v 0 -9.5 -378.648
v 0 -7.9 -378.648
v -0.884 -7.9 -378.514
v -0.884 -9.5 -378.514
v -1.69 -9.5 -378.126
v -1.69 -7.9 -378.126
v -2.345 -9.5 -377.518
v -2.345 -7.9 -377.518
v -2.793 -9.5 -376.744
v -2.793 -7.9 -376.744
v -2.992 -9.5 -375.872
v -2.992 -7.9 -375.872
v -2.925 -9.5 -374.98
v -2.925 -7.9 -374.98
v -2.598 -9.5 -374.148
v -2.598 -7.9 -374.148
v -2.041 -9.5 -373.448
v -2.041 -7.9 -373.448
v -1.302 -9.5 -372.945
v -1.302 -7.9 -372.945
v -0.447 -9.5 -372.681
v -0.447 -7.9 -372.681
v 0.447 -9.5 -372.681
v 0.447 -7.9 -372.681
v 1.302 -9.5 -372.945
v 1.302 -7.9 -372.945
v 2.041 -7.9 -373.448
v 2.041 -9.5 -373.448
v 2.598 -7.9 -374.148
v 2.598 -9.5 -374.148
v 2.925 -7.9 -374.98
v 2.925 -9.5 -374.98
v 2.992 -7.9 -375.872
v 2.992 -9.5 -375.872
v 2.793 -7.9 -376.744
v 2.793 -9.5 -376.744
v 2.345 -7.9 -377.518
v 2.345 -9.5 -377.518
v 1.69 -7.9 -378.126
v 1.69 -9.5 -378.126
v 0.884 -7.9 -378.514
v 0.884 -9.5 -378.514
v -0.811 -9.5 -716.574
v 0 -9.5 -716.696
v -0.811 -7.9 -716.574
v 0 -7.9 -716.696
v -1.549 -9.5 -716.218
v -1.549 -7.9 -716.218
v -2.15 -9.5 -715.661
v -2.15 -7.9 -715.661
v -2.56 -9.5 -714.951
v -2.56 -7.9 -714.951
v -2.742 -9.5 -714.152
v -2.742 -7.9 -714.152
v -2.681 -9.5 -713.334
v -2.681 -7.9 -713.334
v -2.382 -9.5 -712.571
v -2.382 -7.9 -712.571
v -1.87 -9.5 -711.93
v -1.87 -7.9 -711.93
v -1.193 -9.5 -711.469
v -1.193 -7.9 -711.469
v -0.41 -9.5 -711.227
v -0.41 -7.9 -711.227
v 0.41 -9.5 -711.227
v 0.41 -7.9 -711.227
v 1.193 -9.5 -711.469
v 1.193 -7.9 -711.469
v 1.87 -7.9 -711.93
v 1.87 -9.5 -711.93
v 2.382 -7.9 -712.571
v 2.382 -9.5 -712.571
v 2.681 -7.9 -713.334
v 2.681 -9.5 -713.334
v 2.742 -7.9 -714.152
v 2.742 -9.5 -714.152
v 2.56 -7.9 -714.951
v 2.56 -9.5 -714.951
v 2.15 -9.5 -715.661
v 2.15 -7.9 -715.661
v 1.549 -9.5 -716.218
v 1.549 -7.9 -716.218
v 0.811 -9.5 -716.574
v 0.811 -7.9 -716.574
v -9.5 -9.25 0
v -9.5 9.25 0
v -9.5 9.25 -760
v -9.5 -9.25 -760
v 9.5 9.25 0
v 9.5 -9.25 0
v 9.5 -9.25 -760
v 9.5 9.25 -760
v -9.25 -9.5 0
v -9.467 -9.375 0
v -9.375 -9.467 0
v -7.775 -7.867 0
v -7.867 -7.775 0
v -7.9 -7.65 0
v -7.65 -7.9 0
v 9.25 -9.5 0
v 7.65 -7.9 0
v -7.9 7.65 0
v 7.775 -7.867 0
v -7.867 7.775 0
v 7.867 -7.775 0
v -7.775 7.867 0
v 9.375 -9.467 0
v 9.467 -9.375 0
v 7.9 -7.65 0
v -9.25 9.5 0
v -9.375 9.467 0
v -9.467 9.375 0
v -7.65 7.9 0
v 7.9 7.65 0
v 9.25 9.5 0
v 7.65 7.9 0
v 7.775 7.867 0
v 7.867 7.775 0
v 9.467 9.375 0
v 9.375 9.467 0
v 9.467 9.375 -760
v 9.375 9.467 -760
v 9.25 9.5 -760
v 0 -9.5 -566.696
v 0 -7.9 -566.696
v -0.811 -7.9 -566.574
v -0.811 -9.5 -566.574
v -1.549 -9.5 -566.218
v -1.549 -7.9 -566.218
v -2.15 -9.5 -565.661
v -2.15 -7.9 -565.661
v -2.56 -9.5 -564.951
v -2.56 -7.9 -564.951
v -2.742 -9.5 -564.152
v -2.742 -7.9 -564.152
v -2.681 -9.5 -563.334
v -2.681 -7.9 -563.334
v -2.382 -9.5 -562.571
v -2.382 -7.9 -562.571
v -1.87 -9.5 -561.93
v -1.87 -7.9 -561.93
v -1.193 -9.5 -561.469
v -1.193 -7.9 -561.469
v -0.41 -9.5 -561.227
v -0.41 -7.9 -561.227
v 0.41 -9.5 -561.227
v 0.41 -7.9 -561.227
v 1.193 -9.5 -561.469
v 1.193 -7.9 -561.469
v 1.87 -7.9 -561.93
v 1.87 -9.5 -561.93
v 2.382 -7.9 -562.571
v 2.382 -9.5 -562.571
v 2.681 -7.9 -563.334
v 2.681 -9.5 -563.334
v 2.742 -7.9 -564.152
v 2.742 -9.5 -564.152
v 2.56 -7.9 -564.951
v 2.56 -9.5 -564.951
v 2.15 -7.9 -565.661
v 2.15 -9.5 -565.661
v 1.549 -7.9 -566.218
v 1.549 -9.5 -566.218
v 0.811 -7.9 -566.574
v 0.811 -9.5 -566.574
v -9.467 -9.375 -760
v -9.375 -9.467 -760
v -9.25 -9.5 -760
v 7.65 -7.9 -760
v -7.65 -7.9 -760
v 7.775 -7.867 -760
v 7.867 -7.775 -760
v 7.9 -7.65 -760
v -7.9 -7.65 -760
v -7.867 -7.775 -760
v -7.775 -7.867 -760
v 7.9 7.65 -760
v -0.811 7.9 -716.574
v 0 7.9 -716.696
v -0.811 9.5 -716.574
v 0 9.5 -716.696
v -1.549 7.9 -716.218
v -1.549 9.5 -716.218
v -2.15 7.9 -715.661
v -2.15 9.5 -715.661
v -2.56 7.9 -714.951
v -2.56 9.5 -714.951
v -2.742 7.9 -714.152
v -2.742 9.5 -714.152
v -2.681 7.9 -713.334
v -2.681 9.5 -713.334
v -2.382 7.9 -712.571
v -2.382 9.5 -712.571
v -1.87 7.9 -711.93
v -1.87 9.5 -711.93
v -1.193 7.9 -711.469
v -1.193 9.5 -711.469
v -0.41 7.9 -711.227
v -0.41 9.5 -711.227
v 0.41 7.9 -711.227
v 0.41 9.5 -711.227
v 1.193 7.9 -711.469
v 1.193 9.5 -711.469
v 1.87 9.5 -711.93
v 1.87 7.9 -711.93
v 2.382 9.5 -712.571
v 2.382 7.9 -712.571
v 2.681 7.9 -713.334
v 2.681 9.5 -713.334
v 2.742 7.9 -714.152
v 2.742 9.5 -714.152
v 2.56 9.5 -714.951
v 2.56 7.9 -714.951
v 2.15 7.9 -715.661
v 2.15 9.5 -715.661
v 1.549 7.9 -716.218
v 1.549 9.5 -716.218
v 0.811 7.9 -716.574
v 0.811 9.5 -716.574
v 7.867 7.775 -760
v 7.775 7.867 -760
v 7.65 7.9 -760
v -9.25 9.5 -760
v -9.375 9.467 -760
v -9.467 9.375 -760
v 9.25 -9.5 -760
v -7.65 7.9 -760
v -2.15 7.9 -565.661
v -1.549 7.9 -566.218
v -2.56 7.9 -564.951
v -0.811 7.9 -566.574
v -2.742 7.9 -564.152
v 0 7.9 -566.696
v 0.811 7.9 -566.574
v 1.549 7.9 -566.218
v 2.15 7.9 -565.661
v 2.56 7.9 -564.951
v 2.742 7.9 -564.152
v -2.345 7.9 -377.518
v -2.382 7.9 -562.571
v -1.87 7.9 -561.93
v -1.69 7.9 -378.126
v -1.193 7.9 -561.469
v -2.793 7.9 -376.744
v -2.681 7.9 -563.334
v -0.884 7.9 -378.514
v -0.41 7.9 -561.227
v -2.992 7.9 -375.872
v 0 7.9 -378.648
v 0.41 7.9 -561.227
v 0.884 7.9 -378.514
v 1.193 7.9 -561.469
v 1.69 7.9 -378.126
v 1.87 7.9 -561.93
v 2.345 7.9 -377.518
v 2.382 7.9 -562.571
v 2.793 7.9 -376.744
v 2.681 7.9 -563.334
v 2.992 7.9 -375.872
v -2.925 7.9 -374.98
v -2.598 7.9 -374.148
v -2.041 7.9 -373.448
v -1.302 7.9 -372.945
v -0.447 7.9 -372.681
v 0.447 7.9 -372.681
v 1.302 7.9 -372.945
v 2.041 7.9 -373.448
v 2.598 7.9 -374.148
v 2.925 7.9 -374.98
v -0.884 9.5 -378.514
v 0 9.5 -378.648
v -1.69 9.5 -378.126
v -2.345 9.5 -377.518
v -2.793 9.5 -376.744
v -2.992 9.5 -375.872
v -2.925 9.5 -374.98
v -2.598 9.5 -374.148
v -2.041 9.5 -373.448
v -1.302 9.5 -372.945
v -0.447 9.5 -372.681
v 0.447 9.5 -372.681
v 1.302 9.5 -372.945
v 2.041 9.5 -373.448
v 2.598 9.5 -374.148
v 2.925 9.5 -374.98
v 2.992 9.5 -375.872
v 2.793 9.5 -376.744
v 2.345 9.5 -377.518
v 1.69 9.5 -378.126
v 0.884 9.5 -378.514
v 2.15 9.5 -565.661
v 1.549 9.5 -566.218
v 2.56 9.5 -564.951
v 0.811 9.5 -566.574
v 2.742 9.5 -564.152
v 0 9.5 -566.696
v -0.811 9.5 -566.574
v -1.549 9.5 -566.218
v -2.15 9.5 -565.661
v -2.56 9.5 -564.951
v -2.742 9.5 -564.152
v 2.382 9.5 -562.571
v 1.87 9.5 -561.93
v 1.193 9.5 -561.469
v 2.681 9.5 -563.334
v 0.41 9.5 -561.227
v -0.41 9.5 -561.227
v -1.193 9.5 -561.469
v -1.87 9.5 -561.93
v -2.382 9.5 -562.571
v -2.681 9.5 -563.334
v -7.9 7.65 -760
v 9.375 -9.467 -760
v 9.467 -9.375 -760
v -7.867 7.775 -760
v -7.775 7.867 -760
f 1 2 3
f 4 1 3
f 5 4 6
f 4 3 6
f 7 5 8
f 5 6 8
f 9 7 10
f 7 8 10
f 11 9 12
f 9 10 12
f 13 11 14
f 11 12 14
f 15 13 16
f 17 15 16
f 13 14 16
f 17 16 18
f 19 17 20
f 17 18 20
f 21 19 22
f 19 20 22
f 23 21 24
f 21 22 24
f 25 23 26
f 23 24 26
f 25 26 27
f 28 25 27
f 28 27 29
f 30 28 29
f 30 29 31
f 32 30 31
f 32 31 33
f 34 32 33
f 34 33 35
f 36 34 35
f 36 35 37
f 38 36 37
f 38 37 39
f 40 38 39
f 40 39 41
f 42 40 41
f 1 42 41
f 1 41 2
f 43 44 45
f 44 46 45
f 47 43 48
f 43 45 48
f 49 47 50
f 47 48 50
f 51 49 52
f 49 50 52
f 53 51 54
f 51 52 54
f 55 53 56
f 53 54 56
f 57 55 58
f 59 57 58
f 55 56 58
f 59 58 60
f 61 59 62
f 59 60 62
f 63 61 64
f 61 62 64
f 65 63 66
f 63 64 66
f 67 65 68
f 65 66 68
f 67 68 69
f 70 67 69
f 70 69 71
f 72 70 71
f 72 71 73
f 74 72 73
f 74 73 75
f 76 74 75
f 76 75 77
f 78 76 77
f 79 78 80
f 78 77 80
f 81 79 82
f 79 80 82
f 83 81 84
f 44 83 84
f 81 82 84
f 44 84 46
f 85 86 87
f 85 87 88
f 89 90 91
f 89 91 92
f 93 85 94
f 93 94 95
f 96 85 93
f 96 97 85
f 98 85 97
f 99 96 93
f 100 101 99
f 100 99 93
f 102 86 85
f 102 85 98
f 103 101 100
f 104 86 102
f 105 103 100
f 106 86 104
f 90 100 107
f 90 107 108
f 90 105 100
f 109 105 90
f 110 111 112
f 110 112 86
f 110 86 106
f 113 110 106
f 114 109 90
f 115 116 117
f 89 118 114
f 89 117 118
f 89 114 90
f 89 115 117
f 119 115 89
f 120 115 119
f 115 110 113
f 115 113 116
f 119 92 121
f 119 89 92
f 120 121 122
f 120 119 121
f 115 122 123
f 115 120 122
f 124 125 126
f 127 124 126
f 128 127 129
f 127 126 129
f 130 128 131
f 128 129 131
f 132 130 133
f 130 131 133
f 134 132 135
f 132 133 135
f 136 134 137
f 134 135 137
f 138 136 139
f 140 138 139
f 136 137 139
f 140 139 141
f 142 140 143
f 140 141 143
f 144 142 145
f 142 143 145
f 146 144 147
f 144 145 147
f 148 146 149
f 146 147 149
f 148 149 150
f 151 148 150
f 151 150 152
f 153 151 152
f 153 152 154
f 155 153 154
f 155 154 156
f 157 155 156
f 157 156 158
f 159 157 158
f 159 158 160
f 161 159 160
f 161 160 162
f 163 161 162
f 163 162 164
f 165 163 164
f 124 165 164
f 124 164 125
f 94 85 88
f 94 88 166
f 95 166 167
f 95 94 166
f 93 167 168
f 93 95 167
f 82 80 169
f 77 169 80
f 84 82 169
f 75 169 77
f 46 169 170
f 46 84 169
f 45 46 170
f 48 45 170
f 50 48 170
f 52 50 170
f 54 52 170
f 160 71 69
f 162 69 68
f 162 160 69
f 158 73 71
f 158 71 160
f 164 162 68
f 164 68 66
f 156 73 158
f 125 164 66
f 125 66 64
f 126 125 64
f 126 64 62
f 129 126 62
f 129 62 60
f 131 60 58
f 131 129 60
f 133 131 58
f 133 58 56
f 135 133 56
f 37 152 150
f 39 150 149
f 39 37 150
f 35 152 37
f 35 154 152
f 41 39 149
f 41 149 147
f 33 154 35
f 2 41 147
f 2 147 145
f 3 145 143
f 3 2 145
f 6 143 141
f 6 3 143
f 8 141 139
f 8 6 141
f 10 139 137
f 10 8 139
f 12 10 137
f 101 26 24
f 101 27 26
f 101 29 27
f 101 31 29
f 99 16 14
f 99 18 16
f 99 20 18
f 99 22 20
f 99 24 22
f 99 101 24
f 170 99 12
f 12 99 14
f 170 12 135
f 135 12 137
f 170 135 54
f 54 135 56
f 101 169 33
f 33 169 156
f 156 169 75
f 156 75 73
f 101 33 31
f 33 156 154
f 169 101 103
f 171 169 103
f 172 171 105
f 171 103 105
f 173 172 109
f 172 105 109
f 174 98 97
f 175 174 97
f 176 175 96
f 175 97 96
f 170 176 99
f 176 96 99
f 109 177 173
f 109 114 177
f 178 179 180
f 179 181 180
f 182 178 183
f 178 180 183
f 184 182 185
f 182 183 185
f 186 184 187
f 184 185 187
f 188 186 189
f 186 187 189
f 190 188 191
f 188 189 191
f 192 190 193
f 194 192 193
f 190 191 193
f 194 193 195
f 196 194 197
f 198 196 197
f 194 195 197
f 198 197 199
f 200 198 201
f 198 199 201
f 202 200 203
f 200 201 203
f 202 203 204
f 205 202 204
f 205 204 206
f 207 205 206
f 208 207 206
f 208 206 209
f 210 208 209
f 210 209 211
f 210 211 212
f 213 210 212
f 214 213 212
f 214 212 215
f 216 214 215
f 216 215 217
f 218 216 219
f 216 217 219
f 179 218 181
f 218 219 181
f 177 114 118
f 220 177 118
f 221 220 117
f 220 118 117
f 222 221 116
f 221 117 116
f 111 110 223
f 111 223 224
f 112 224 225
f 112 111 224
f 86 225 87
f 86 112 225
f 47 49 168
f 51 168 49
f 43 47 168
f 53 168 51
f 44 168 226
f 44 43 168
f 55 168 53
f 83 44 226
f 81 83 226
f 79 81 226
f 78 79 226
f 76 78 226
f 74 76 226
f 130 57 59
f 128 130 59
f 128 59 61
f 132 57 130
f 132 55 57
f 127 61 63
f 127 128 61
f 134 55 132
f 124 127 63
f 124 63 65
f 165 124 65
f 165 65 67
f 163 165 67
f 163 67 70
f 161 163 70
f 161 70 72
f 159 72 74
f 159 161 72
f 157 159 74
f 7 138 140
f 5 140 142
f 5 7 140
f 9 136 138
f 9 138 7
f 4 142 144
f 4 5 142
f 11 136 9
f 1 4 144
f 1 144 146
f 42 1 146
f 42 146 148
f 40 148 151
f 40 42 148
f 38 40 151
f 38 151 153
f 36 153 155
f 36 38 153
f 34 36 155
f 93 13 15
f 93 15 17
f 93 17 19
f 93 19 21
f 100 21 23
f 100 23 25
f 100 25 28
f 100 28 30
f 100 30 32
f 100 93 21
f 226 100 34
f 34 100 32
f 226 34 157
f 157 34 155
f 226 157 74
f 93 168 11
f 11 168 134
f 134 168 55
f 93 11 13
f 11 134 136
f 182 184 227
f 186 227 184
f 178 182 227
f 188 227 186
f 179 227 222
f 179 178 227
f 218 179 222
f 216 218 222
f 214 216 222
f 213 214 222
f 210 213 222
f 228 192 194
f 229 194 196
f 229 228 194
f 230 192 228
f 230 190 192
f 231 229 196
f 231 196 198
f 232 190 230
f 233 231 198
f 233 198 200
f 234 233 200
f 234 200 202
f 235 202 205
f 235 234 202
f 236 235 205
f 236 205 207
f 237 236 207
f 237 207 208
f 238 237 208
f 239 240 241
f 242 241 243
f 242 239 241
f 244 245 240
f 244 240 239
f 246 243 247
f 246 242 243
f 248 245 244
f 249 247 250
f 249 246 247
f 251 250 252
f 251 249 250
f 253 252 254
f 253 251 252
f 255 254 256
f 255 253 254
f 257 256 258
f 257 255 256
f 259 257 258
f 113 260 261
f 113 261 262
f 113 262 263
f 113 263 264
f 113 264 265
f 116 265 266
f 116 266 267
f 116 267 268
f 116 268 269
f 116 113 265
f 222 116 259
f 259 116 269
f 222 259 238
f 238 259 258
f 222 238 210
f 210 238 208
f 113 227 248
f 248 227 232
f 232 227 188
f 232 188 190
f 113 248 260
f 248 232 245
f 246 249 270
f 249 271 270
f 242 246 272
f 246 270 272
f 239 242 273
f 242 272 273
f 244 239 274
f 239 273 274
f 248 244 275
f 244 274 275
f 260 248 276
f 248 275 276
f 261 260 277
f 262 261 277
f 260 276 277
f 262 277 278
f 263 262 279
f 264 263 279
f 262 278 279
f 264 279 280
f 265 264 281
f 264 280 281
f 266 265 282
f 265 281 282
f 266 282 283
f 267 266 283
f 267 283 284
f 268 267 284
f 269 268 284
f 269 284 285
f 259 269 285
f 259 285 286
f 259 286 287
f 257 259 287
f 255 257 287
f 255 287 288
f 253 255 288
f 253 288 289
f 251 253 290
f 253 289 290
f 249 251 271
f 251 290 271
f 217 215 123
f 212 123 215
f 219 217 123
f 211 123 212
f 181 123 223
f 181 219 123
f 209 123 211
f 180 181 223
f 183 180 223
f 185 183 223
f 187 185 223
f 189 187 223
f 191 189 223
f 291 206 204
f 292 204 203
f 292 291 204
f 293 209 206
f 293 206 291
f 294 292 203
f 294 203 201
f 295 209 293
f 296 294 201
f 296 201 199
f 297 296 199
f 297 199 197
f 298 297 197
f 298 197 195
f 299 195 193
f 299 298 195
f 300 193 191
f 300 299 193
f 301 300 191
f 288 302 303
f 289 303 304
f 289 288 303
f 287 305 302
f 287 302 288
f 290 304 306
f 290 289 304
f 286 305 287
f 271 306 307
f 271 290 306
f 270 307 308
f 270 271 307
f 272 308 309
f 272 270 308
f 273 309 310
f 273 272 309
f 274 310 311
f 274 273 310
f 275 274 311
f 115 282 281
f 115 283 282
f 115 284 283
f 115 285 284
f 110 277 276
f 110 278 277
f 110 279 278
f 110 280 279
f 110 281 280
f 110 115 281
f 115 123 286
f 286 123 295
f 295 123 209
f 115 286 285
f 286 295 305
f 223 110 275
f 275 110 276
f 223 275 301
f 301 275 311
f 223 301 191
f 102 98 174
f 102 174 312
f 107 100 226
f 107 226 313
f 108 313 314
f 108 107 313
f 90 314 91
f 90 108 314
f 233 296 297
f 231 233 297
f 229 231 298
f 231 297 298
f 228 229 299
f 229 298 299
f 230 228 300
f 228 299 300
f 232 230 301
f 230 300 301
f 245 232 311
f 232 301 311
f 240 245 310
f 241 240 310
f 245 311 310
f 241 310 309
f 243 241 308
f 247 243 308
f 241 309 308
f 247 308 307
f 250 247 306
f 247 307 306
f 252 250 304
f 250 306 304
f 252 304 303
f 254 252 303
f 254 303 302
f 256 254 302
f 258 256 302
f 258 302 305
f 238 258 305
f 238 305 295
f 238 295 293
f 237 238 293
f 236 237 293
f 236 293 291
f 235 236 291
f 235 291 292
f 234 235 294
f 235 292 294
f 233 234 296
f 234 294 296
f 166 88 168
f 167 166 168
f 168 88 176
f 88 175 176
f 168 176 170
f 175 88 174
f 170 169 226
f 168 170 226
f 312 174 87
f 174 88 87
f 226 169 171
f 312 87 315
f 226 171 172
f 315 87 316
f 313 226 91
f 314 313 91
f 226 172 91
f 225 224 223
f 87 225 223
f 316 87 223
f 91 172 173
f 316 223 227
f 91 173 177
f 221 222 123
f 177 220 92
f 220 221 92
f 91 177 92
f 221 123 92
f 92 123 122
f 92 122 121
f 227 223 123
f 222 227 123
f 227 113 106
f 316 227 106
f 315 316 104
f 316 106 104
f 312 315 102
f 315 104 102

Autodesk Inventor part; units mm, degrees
ref_plane "YZ Plane" through (0, 0, 0) normal (1, 0, 0) x (0, 1, 0)
ref_plane "XZ Plane" through (0, 0, 0) normal (0, 1, 0) x (-1, 0, 0)
ref_plane "XY Plane" through (0, 0, 0) normal (0, 0, 1) x (1, 0, 0)
sketch "Sketch2" plane through (0, 0, 0) normal (0, 0, 1) x (1, 0, 0)
  line L0 (-9.25, -9.5) -> (9.25, -9.5)
  line L1 (9.5, -9.25) -> (9.5, 9.25)
  line L2 (9.25, 9.5) -> (-9.25, 9.5)
  line L3 (-9.5, 9.25) -> (-9.5, -9.25)
  line L4 (-9.5, -9.5) -> (9.5, 9.5) construction
  line L5 (9.5, -9.5) -> (-9.5, 9.5) construction
  line L6 (-7.65, 7.9) -> (7.65, 7.9)
  line L7 (7.9, 7.65) -> (7.9, -7.65)
  line L8 (7.65, -7.9) -> (-7.65, -7.9)
  line L9 (-7.9, -7.65) -> (-7.9, 7.65)
  arc A0 (-9.25, 9.5) -> (-9.5, 9.25) centre (-9.25, 9.25) ccw
  arc A1 (-7.65, 7.9) -> (-7.9, 7.65) centre (-7.65, 7.65) ccw
  arc A2 (9.5, 9.25) -> (9.25, 9.5) centre (9.25, 9.25) ccw
  arc A3 (9.25, -9.5) -> (9.5, -9.25) centre (9.25, -9.25) ccw
  arc A4 (-9.5, -9.25) -> (-9.25, -9.5) centre (-9.25, -9.25) ccw
  arc A5 (-7.9, -7.65) -> (-7.65, -7.9) centre (-7.65, -7.65) ccw
  arc A6 (7.9, 7.65) -> (7.65, 7.9) centre (7.65, 7.65) ccw
  arc A7 (7.65, -7.9) -> (7.9, -7.65) centre (7.65, -7.65) ccw
  point P0 (0, 0)
  dimension "d0" = 19
  dimension "d1" = 19
  dimension "d2" = 1.6
  dimension "d3" = 0.25
extrude "Extrusion1" add sketch "Sketch2" against normal blind 760
sketch "Sketch3" plane through (-9.25, -9.5, 0) normal (0, -1, 0) x (1, 0, 0)
  circle A0 centre (9.25, -713.9463) radius 3.175 projected
  circle A1 centre (9.25, -563.9463) radius 3.175 projected
  point P0 (9.25, 0)
hole "Hole1" at (0, -9.5, -563.9463) at (0, -9.5, -713.9463) direction (0, 1, 0) diameter 5.5 end through all
sketch "Sketch5" plane through (-9.25, -9.5, 0) normal (0, -1, 0) x (1, 0, 0)
  circle A0 centre (9.25, -375.6475) radius 3 projected
  point P0 (9.25, 0)
hole "Hole2" at (0, -9.5, -375.6475) direction (0, 1, 0) diameter 6 end through all
properties part number "bpSupArm37"
